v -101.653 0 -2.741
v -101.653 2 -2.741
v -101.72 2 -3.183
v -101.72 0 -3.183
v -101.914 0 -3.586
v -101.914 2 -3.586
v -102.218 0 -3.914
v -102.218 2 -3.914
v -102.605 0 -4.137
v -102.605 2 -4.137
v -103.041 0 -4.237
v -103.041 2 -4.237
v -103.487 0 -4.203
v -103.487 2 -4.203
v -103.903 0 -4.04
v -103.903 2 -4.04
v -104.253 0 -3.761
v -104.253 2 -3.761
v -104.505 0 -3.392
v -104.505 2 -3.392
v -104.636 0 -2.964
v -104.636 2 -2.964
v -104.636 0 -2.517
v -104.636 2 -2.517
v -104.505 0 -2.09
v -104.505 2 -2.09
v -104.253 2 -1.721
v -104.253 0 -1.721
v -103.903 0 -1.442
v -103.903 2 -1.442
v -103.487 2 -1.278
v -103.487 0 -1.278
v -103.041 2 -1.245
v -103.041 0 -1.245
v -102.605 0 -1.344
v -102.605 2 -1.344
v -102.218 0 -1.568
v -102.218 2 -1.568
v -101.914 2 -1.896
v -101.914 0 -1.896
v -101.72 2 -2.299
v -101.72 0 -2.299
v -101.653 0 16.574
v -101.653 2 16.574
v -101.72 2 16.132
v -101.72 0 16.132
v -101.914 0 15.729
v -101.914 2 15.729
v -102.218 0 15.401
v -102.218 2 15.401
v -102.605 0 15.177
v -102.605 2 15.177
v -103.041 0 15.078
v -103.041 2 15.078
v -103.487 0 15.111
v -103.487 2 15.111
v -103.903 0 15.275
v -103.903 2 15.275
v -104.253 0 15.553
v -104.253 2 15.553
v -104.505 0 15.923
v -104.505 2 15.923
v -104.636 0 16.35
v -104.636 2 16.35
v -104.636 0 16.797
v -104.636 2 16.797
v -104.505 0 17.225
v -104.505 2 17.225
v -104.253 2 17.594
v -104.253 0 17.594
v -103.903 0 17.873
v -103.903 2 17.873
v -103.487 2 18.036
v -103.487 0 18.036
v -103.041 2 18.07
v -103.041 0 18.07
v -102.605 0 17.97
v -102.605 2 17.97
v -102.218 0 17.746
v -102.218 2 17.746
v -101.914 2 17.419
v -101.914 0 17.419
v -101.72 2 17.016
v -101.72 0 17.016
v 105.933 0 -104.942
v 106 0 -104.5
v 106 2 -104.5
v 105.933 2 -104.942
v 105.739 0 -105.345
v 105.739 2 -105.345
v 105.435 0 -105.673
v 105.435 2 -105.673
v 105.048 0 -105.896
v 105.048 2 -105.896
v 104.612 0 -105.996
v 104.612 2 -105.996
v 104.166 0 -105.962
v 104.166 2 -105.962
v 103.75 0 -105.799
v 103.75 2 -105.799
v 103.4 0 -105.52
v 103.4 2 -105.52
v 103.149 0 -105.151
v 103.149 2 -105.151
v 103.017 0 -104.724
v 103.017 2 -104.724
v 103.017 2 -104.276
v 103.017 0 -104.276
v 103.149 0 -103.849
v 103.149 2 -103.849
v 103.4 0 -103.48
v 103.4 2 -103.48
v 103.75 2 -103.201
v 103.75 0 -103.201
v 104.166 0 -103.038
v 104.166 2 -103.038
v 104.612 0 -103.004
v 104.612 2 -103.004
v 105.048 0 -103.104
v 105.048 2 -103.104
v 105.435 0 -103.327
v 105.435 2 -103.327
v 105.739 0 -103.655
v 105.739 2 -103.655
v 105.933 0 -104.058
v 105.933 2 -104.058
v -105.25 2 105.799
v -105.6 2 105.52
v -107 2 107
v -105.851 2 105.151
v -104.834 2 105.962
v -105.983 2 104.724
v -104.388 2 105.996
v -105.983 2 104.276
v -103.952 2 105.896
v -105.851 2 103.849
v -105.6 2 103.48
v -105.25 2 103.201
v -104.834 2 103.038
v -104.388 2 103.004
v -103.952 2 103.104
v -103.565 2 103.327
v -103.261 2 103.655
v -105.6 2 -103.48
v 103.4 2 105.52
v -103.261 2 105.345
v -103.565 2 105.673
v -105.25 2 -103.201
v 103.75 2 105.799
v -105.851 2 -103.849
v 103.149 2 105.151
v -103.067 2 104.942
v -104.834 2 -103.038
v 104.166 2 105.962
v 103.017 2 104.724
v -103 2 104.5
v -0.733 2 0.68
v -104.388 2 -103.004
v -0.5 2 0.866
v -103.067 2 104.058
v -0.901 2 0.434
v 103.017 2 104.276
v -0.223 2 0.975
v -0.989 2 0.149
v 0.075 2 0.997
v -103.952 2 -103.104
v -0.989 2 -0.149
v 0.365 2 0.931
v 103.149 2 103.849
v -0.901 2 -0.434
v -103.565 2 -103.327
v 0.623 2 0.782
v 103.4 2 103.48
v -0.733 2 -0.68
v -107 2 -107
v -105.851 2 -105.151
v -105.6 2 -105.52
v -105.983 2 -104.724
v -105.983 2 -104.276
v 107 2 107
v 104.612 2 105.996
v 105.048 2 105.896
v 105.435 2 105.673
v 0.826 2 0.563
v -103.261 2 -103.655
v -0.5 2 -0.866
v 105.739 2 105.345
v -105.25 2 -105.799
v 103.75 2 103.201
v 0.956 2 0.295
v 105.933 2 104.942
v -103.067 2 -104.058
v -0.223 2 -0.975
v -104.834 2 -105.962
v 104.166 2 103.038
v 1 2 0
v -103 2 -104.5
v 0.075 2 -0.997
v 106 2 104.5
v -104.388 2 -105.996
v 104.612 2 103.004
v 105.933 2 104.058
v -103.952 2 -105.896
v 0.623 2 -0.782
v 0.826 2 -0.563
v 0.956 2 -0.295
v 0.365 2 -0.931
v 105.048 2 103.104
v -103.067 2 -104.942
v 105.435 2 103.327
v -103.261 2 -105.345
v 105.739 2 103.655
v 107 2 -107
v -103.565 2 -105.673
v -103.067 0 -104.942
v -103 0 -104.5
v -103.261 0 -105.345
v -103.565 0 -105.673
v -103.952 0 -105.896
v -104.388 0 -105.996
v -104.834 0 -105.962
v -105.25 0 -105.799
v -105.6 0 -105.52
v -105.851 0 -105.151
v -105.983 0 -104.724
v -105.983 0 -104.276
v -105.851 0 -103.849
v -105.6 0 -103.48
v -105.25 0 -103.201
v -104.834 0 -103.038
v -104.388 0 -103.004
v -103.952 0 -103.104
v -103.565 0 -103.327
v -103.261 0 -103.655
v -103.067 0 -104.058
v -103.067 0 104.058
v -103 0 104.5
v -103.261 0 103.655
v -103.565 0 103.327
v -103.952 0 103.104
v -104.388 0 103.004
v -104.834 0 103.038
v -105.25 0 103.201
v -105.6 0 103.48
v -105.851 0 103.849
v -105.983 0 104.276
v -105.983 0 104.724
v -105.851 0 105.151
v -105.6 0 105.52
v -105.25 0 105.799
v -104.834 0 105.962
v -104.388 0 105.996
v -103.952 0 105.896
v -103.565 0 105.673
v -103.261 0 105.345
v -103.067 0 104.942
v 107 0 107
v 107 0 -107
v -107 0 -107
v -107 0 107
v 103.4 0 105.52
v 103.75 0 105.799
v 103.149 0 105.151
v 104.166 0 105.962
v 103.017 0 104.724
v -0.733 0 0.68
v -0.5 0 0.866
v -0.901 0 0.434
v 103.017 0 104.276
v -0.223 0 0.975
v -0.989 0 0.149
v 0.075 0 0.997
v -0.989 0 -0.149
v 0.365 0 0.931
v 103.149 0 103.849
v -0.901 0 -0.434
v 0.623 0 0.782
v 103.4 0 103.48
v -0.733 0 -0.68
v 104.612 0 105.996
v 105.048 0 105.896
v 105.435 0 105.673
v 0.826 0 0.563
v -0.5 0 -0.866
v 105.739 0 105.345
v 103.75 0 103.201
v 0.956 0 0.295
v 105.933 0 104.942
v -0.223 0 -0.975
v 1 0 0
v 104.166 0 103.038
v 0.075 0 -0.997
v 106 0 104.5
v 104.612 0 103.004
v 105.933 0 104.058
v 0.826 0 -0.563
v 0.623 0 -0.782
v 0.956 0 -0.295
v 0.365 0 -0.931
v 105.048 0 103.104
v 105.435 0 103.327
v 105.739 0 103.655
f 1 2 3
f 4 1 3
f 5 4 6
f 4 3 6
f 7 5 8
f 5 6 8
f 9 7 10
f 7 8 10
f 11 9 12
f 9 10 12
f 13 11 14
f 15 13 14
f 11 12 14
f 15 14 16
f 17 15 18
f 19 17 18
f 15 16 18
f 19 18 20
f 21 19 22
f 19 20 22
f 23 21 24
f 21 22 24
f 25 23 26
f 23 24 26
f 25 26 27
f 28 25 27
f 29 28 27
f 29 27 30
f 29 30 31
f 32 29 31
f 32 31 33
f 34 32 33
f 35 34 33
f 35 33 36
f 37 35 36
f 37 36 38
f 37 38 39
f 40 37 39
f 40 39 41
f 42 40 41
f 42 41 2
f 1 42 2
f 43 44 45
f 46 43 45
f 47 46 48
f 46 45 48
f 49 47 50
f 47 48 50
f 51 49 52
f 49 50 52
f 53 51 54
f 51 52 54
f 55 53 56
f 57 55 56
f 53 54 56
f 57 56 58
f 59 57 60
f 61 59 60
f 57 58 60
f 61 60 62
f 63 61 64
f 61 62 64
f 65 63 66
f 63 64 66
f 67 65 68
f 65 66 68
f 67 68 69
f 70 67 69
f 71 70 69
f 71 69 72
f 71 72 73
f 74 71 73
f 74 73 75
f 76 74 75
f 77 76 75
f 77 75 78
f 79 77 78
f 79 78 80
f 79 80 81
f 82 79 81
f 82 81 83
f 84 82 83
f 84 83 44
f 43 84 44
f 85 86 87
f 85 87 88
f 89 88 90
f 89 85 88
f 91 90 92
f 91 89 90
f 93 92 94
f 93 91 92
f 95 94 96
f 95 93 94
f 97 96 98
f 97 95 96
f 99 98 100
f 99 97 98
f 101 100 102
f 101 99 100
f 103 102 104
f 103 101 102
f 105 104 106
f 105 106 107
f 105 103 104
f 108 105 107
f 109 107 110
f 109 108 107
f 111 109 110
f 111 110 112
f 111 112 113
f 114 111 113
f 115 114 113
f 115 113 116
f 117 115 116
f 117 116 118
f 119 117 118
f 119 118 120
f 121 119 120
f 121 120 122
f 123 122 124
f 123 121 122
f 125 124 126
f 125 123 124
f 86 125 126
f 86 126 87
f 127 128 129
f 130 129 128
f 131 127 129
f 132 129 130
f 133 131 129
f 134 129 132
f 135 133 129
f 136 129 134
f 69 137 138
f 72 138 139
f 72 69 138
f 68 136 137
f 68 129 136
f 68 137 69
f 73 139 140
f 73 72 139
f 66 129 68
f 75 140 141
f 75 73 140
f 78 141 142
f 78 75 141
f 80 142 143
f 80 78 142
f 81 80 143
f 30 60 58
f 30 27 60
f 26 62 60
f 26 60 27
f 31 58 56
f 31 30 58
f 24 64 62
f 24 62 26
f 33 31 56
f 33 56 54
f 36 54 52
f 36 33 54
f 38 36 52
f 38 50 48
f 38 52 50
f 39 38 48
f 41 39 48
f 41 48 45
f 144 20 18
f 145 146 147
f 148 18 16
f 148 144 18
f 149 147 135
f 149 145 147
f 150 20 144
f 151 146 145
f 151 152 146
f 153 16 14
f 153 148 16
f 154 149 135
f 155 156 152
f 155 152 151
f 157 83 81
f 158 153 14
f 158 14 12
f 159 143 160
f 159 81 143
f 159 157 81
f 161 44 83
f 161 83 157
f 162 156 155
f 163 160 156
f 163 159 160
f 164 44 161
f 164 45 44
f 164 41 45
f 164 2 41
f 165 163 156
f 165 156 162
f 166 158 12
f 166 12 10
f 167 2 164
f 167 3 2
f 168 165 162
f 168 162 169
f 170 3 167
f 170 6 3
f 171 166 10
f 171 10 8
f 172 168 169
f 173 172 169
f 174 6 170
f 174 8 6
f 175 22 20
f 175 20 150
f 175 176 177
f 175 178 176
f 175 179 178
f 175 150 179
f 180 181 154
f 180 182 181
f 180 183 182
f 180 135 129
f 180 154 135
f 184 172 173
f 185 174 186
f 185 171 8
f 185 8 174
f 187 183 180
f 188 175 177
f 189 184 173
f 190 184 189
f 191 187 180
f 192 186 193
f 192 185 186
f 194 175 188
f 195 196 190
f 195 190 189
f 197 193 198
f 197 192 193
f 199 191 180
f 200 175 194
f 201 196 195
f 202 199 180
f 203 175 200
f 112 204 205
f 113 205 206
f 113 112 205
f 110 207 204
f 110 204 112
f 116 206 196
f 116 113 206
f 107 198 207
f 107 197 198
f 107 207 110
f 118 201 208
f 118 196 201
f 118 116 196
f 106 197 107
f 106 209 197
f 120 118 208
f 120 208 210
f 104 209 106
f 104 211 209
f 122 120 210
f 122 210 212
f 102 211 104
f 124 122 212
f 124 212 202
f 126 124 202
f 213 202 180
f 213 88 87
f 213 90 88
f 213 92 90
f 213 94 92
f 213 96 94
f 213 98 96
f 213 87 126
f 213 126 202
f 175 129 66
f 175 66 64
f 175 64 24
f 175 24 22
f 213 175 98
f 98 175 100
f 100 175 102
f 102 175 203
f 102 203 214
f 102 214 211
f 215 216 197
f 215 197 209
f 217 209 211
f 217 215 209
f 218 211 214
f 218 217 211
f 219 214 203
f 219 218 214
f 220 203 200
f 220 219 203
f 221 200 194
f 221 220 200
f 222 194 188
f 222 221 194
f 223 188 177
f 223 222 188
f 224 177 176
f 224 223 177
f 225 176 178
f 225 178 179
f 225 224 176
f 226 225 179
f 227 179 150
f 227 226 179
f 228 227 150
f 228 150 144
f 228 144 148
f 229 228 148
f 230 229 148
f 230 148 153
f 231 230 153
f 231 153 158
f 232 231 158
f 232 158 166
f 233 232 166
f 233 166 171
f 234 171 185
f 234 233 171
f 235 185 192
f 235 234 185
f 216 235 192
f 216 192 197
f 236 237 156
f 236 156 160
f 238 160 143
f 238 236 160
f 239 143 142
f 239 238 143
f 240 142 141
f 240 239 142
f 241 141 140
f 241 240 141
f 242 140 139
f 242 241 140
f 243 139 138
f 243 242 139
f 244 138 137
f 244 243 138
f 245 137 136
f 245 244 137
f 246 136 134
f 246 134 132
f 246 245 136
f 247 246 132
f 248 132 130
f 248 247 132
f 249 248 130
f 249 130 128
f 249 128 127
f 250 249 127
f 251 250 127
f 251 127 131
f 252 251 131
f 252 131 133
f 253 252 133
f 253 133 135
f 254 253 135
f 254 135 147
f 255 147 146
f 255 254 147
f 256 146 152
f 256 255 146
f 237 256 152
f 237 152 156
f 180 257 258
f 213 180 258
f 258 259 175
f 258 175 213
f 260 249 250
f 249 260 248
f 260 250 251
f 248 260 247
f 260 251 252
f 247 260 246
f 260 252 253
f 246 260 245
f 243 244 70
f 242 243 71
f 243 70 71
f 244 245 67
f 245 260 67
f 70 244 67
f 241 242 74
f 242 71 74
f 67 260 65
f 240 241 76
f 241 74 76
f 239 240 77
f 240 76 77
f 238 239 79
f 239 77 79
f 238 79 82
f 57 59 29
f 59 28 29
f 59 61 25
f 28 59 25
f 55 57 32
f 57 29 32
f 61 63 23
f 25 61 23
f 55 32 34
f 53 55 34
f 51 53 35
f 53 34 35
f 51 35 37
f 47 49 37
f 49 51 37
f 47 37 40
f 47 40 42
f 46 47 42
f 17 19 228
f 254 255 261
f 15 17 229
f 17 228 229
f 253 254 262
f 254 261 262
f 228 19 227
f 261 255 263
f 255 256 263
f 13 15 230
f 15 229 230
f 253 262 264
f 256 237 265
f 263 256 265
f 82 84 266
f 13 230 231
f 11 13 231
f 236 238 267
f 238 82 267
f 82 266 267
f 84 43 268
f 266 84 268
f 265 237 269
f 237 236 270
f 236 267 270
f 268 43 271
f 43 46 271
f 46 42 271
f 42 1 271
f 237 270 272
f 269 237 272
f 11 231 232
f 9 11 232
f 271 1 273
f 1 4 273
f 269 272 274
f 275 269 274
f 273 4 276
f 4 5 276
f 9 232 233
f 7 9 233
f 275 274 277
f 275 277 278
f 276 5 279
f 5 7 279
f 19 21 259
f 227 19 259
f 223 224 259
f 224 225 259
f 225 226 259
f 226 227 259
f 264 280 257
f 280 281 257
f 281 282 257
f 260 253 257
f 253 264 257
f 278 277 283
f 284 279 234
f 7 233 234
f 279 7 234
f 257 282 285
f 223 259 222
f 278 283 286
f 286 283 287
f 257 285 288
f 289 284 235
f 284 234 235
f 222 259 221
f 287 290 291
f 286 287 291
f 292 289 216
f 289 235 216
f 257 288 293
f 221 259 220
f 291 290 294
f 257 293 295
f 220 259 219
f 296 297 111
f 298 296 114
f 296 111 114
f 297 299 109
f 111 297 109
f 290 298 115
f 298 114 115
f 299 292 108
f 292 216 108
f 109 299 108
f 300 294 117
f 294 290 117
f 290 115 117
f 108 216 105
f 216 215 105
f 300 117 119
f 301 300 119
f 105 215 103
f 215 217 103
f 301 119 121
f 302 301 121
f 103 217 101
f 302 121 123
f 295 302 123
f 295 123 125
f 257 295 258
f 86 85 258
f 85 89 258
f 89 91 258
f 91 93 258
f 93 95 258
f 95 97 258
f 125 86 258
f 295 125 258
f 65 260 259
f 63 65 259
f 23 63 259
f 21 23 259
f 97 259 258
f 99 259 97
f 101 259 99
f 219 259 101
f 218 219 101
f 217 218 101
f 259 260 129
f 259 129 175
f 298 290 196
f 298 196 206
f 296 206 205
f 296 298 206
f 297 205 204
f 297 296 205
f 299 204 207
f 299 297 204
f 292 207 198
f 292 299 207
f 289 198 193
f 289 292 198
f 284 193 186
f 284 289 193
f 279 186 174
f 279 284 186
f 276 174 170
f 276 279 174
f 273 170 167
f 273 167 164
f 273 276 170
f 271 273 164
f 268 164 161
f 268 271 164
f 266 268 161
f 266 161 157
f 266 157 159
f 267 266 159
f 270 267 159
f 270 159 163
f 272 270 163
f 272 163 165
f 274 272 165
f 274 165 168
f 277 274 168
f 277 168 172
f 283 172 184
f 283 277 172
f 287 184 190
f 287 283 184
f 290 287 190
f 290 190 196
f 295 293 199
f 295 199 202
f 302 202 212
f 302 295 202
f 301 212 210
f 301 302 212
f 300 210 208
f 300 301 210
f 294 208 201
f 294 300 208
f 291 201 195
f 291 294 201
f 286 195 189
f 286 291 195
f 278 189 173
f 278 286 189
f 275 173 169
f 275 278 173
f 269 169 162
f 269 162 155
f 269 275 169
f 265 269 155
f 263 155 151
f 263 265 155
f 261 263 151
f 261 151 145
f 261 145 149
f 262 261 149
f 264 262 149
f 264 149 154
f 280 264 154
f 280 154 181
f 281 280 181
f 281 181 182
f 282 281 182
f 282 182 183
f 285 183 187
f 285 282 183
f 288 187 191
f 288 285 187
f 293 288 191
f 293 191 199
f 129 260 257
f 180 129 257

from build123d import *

# Parameters (mm, degrees)
SKETCH_1_W          = 214
SKETCH_1_H          = 214
SKETCH_1_R          = 1.5
SKETCH_1_R_2        = 1
EXTRUDE_1_DEPTH     = 2
SKETCH_4_R          = 1.5
CUT_EXTRUDE_1_DEPTH = 3


with BuildPart() as part:
    # Эскиз1 → Бобышка-Вытянуть1 (new body)
    with BuildSketch(Plane(origin=(0, 0, 0), x_dir=(1, 0, 0), z_dir=(0, 1, 0))):
        Rectangle(SKETCH_1_W, SKETCH_1_H)
        with Locations((-104.5, 104.5)):
            Circle(SKETCH_1_R, mode=Mode.SUBTRACT)
        with Locations((104.5, 104.5)):
            Circle(SKETCH_1_R, mode=Mode.SUBTRACT)
        with Locations((104.5, -104.5)):
            Circle(SKETCH_1_R, mode=Mode.SUBTRACT)
        with Locations((-104.5, -104.5)):
            Circle(SKETCH_1_R, mode=Mode.SUBTRACT)
        Circle(SKETCH_1_R_2, mode=Mode.SUBTRACT)
    extrude(amount=EXTRUDE_1_DEPTH)

    # Эскиз4 → Вырез-Вытянуть1 (cut, through all)
    with BuildSketch(Plane(origin=(0, 2, 0), x_dir=(1, 0, 0), z_dir=(0, 1, 0))):
        with Locations((-103.153252948, 2.740781497)):
            Circle(SKETCH_4_R)
        with Locations((-103.153252948, -16.573740768)):
            Circle(SKETCH_4_R)
    extrude(amount=-CUT_EXTRUDE_1_DEPTH, mode=Mode.SUBTRACT)


solid = part.part
